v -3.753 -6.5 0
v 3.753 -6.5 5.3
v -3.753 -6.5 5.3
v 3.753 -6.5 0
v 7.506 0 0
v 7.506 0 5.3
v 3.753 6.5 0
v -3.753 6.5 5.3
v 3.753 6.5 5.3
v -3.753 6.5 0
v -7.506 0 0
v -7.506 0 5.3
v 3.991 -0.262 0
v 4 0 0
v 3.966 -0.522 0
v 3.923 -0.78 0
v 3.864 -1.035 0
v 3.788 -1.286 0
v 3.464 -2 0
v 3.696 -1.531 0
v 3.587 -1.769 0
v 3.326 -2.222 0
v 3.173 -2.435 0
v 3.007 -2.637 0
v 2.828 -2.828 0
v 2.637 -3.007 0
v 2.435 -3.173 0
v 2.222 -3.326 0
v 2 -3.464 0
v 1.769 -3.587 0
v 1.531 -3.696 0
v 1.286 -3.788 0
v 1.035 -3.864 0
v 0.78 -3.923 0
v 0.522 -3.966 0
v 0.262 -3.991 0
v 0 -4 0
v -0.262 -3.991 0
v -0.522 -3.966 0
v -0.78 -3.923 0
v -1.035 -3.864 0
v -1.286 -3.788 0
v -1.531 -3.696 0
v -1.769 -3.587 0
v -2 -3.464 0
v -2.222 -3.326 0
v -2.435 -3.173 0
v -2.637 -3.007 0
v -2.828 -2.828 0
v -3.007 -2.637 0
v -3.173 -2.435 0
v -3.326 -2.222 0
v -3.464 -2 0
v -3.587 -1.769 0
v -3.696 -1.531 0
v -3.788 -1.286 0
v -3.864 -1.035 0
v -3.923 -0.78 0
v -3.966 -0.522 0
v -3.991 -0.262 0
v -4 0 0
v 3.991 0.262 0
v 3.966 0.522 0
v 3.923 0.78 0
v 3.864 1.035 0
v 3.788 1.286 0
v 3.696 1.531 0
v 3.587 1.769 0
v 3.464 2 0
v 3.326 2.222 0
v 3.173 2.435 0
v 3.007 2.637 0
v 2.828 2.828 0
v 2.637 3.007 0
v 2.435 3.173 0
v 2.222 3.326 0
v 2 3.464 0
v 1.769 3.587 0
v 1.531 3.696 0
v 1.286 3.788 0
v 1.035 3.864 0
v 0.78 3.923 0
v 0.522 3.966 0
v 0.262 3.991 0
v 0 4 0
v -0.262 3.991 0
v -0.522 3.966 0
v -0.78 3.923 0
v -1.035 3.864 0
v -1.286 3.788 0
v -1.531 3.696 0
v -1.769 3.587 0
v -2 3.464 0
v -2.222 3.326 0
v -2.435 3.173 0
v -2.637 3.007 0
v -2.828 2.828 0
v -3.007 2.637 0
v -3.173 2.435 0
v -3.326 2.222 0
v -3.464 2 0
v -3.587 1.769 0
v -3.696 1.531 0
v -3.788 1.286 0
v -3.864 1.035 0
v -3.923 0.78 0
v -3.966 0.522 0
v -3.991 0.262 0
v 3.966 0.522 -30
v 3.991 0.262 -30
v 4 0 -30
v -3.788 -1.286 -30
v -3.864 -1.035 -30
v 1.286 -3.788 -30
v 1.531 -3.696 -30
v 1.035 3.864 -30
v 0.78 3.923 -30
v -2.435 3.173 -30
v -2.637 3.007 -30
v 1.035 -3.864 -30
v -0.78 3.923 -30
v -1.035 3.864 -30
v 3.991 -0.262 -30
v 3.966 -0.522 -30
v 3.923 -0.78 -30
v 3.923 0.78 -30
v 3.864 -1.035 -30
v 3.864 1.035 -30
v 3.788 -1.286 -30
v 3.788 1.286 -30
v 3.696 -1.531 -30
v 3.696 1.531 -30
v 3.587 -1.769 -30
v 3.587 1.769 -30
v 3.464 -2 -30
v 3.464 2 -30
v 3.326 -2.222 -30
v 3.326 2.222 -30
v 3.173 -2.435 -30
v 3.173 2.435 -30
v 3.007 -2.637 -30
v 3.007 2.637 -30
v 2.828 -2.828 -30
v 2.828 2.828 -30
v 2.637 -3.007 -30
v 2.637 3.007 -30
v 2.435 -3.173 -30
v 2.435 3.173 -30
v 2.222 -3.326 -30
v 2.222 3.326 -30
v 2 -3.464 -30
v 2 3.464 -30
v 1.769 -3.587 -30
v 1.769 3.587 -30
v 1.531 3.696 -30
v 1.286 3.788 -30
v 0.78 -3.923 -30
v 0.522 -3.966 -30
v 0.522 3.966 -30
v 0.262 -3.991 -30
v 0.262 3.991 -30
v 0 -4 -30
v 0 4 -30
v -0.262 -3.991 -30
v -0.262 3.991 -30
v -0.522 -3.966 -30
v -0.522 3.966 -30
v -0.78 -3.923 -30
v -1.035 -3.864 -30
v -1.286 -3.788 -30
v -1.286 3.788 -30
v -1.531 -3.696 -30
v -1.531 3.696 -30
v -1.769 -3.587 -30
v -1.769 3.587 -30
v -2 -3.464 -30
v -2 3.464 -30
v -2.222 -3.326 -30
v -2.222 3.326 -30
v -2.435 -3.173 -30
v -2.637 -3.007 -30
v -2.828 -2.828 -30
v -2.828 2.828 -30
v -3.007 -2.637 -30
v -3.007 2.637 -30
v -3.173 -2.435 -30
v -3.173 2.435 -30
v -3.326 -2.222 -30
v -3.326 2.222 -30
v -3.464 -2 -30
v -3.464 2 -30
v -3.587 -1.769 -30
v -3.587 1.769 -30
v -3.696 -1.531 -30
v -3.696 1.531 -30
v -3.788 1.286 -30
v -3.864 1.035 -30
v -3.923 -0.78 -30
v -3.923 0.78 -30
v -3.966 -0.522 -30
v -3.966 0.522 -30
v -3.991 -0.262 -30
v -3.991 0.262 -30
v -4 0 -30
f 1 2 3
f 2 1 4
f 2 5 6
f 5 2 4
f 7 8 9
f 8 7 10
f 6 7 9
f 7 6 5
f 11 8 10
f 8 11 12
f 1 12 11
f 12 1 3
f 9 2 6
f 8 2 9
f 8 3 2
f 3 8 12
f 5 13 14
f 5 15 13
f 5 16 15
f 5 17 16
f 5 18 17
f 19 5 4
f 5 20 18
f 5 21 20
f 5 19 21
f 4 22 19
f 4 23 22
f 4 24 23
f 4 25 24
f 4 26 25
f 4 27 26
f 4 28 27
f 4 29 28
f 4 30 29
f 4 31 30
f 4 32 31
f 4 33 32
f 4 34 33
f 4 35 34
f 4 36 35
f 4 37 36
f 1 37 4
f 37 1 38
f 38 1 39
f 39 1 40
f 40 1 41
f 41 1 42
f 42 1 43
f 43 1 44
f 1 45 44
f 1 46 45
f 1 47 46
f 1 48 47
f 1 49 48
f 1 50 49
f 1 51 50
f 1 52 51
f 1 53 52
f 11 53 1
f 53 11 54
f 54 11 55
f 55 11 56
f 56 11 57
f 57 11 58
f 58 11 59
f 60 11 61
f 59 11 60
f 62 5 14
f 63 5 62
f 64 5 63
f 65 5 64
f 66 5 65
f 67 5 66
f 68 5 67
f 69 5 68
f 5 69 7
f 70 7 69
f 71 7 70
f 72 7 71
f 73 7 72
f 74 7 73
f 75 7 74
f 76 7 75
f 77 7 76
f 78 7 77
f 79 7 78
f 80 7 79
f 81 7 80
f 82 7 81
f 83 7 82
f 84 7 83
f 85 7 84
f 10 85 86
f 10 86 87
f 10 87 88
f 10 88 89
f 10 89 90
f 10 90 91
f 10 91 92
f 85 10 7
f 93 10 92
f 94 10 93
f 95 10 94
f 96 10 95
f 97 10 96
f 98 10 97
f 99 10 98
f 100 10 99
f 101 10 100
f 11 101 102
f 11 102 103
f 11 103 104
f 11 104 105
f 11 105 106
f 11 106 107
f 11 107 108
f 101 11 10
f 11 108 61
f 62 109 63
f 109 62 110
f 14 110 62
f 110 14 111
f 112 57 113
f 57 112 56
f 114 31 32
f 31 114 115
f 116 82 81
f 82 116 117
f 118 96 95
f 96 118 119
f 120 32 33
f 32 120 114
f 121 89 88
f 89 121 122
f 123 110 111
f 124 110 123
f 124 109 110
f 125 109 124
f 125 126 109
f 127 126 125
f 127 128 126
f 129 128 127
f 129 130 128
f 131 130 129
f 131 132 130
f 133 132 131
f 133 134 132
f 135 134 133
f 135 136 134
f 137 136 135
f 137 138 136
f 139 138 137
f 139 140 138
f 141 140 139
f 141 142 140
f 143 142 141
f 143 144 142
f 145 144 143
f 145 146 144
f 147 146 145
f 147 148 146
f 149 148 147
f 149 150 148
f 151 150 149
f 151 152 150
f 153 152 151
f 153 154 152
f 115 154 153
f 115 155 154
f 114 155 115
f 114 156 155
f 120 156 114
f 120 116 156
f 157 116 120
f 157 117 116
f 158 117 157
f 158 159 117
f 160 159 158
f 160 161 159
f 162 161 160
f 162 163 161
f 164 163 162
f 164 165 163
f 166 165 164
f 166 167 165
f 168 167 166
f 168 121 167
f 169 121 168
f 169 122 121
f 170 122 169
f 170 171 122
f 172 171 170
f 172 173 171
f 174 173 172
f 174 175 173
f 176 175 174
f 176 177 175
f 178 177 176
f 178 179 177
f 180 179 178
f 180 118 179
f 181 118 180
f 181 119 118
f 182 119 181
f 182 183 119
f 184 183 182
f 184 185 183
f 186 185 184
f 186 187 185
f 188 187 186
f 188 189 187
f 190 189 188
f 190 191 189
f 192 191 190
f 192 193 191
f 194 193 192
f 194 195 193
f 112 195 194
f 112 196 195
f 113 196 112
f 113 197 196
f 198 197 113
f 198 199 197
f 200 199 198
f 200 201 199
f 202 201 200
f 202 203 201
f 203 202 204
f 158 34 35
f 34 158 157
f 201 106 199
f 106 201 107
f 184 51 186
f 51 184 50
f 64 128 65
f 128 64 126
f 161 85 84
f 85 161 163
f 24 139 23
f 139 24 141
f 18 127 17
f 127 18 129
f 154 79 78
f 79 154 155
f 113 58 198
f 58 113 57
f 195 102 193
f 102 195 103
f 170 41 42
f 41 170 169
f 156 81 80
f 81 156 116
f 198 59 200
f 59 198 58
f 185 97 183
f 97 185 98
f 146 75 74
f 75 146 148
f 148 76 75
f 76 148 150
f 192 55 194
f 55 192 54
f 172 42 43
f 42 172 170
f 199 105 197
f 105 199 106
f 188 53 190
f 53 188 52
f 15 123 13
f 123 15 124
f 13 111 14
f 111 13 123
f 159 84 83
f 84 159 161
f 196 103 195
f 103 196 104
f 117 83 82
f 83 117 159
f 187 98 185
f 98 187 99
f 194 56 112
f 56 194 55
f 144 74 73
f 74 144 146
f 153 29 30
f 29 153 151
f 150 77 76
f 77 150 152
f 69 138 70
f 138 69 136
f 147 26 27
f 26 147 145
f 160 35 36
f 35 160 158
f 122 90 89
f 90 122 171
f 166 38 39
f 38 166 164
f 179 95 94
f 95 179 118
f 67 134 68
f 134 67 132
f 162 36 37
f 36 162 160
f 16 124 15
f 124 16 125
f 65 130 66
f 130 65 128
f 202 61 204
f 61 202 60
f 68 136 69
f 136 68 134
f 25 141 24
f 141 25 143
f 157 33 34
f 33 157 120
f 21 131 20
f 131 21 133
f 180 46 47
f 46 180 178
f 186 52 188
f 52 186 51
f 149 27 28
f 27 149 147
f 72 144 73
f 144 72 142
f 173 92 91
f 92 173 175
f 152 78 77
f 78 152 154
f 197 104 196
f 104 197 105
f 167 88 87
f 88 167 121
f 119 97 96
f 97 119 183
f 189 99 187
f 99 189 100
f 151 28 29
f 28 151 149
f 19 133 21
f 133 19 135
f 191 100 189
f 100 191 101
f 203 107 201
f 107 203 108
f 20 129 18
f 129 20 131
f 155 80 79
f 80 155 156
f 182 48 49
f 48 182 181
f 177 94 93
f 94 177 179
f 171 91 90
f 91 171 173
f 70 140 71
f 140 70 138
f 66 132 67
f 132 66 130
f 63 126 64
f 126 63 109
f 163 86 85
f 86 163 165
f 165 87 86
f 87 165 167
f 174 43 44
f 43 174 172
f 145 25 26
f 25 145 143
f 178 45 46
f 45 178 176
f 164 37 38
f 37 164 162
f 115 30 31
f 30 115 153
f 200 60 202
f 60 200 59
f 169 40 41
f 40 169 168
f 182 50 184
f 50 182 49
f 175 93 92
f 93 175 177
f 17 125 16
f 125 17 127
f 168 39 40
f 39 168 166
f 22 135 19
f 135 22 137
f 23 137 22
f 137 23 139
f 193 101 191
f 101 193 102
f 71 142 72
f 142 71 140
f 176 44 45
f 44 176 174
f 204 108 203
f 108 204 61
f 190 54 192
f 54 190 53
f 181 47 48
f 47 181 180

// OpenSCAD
// M8 六角ボルト(ねじ山省略・シャンクは円柱)
// 頭部底面が z = 0、シャンクは -Z 方向へ

// ---- 寸法パラメータ ----
head_af     = 13;    // 頭部 対辺距離 (across-flats)
head_height = 5.3;   // 頭部 高さ
shank_dia   = 8;     // シャンク 直径 (M8)
shank_len   = 30;    // シャンク 長さ

$fn = 96;            // 円柱の分割数

// 対辺距離 -> 外接円半径
head_r = head_af / sqrt(3);

module hex_bolt_m8() {
    // 頭部(六角柱): z = 0 〜 head_height
    cylinder(h = head_height, r = head_r, $fn = 6);

    // シャンク(円柱): z = 0 〜 -shank_len
    translate([0, 0, -shank_len])
        cylinder(h = shank_len, d = shank_dia);
}

hex_bolt_m8();
